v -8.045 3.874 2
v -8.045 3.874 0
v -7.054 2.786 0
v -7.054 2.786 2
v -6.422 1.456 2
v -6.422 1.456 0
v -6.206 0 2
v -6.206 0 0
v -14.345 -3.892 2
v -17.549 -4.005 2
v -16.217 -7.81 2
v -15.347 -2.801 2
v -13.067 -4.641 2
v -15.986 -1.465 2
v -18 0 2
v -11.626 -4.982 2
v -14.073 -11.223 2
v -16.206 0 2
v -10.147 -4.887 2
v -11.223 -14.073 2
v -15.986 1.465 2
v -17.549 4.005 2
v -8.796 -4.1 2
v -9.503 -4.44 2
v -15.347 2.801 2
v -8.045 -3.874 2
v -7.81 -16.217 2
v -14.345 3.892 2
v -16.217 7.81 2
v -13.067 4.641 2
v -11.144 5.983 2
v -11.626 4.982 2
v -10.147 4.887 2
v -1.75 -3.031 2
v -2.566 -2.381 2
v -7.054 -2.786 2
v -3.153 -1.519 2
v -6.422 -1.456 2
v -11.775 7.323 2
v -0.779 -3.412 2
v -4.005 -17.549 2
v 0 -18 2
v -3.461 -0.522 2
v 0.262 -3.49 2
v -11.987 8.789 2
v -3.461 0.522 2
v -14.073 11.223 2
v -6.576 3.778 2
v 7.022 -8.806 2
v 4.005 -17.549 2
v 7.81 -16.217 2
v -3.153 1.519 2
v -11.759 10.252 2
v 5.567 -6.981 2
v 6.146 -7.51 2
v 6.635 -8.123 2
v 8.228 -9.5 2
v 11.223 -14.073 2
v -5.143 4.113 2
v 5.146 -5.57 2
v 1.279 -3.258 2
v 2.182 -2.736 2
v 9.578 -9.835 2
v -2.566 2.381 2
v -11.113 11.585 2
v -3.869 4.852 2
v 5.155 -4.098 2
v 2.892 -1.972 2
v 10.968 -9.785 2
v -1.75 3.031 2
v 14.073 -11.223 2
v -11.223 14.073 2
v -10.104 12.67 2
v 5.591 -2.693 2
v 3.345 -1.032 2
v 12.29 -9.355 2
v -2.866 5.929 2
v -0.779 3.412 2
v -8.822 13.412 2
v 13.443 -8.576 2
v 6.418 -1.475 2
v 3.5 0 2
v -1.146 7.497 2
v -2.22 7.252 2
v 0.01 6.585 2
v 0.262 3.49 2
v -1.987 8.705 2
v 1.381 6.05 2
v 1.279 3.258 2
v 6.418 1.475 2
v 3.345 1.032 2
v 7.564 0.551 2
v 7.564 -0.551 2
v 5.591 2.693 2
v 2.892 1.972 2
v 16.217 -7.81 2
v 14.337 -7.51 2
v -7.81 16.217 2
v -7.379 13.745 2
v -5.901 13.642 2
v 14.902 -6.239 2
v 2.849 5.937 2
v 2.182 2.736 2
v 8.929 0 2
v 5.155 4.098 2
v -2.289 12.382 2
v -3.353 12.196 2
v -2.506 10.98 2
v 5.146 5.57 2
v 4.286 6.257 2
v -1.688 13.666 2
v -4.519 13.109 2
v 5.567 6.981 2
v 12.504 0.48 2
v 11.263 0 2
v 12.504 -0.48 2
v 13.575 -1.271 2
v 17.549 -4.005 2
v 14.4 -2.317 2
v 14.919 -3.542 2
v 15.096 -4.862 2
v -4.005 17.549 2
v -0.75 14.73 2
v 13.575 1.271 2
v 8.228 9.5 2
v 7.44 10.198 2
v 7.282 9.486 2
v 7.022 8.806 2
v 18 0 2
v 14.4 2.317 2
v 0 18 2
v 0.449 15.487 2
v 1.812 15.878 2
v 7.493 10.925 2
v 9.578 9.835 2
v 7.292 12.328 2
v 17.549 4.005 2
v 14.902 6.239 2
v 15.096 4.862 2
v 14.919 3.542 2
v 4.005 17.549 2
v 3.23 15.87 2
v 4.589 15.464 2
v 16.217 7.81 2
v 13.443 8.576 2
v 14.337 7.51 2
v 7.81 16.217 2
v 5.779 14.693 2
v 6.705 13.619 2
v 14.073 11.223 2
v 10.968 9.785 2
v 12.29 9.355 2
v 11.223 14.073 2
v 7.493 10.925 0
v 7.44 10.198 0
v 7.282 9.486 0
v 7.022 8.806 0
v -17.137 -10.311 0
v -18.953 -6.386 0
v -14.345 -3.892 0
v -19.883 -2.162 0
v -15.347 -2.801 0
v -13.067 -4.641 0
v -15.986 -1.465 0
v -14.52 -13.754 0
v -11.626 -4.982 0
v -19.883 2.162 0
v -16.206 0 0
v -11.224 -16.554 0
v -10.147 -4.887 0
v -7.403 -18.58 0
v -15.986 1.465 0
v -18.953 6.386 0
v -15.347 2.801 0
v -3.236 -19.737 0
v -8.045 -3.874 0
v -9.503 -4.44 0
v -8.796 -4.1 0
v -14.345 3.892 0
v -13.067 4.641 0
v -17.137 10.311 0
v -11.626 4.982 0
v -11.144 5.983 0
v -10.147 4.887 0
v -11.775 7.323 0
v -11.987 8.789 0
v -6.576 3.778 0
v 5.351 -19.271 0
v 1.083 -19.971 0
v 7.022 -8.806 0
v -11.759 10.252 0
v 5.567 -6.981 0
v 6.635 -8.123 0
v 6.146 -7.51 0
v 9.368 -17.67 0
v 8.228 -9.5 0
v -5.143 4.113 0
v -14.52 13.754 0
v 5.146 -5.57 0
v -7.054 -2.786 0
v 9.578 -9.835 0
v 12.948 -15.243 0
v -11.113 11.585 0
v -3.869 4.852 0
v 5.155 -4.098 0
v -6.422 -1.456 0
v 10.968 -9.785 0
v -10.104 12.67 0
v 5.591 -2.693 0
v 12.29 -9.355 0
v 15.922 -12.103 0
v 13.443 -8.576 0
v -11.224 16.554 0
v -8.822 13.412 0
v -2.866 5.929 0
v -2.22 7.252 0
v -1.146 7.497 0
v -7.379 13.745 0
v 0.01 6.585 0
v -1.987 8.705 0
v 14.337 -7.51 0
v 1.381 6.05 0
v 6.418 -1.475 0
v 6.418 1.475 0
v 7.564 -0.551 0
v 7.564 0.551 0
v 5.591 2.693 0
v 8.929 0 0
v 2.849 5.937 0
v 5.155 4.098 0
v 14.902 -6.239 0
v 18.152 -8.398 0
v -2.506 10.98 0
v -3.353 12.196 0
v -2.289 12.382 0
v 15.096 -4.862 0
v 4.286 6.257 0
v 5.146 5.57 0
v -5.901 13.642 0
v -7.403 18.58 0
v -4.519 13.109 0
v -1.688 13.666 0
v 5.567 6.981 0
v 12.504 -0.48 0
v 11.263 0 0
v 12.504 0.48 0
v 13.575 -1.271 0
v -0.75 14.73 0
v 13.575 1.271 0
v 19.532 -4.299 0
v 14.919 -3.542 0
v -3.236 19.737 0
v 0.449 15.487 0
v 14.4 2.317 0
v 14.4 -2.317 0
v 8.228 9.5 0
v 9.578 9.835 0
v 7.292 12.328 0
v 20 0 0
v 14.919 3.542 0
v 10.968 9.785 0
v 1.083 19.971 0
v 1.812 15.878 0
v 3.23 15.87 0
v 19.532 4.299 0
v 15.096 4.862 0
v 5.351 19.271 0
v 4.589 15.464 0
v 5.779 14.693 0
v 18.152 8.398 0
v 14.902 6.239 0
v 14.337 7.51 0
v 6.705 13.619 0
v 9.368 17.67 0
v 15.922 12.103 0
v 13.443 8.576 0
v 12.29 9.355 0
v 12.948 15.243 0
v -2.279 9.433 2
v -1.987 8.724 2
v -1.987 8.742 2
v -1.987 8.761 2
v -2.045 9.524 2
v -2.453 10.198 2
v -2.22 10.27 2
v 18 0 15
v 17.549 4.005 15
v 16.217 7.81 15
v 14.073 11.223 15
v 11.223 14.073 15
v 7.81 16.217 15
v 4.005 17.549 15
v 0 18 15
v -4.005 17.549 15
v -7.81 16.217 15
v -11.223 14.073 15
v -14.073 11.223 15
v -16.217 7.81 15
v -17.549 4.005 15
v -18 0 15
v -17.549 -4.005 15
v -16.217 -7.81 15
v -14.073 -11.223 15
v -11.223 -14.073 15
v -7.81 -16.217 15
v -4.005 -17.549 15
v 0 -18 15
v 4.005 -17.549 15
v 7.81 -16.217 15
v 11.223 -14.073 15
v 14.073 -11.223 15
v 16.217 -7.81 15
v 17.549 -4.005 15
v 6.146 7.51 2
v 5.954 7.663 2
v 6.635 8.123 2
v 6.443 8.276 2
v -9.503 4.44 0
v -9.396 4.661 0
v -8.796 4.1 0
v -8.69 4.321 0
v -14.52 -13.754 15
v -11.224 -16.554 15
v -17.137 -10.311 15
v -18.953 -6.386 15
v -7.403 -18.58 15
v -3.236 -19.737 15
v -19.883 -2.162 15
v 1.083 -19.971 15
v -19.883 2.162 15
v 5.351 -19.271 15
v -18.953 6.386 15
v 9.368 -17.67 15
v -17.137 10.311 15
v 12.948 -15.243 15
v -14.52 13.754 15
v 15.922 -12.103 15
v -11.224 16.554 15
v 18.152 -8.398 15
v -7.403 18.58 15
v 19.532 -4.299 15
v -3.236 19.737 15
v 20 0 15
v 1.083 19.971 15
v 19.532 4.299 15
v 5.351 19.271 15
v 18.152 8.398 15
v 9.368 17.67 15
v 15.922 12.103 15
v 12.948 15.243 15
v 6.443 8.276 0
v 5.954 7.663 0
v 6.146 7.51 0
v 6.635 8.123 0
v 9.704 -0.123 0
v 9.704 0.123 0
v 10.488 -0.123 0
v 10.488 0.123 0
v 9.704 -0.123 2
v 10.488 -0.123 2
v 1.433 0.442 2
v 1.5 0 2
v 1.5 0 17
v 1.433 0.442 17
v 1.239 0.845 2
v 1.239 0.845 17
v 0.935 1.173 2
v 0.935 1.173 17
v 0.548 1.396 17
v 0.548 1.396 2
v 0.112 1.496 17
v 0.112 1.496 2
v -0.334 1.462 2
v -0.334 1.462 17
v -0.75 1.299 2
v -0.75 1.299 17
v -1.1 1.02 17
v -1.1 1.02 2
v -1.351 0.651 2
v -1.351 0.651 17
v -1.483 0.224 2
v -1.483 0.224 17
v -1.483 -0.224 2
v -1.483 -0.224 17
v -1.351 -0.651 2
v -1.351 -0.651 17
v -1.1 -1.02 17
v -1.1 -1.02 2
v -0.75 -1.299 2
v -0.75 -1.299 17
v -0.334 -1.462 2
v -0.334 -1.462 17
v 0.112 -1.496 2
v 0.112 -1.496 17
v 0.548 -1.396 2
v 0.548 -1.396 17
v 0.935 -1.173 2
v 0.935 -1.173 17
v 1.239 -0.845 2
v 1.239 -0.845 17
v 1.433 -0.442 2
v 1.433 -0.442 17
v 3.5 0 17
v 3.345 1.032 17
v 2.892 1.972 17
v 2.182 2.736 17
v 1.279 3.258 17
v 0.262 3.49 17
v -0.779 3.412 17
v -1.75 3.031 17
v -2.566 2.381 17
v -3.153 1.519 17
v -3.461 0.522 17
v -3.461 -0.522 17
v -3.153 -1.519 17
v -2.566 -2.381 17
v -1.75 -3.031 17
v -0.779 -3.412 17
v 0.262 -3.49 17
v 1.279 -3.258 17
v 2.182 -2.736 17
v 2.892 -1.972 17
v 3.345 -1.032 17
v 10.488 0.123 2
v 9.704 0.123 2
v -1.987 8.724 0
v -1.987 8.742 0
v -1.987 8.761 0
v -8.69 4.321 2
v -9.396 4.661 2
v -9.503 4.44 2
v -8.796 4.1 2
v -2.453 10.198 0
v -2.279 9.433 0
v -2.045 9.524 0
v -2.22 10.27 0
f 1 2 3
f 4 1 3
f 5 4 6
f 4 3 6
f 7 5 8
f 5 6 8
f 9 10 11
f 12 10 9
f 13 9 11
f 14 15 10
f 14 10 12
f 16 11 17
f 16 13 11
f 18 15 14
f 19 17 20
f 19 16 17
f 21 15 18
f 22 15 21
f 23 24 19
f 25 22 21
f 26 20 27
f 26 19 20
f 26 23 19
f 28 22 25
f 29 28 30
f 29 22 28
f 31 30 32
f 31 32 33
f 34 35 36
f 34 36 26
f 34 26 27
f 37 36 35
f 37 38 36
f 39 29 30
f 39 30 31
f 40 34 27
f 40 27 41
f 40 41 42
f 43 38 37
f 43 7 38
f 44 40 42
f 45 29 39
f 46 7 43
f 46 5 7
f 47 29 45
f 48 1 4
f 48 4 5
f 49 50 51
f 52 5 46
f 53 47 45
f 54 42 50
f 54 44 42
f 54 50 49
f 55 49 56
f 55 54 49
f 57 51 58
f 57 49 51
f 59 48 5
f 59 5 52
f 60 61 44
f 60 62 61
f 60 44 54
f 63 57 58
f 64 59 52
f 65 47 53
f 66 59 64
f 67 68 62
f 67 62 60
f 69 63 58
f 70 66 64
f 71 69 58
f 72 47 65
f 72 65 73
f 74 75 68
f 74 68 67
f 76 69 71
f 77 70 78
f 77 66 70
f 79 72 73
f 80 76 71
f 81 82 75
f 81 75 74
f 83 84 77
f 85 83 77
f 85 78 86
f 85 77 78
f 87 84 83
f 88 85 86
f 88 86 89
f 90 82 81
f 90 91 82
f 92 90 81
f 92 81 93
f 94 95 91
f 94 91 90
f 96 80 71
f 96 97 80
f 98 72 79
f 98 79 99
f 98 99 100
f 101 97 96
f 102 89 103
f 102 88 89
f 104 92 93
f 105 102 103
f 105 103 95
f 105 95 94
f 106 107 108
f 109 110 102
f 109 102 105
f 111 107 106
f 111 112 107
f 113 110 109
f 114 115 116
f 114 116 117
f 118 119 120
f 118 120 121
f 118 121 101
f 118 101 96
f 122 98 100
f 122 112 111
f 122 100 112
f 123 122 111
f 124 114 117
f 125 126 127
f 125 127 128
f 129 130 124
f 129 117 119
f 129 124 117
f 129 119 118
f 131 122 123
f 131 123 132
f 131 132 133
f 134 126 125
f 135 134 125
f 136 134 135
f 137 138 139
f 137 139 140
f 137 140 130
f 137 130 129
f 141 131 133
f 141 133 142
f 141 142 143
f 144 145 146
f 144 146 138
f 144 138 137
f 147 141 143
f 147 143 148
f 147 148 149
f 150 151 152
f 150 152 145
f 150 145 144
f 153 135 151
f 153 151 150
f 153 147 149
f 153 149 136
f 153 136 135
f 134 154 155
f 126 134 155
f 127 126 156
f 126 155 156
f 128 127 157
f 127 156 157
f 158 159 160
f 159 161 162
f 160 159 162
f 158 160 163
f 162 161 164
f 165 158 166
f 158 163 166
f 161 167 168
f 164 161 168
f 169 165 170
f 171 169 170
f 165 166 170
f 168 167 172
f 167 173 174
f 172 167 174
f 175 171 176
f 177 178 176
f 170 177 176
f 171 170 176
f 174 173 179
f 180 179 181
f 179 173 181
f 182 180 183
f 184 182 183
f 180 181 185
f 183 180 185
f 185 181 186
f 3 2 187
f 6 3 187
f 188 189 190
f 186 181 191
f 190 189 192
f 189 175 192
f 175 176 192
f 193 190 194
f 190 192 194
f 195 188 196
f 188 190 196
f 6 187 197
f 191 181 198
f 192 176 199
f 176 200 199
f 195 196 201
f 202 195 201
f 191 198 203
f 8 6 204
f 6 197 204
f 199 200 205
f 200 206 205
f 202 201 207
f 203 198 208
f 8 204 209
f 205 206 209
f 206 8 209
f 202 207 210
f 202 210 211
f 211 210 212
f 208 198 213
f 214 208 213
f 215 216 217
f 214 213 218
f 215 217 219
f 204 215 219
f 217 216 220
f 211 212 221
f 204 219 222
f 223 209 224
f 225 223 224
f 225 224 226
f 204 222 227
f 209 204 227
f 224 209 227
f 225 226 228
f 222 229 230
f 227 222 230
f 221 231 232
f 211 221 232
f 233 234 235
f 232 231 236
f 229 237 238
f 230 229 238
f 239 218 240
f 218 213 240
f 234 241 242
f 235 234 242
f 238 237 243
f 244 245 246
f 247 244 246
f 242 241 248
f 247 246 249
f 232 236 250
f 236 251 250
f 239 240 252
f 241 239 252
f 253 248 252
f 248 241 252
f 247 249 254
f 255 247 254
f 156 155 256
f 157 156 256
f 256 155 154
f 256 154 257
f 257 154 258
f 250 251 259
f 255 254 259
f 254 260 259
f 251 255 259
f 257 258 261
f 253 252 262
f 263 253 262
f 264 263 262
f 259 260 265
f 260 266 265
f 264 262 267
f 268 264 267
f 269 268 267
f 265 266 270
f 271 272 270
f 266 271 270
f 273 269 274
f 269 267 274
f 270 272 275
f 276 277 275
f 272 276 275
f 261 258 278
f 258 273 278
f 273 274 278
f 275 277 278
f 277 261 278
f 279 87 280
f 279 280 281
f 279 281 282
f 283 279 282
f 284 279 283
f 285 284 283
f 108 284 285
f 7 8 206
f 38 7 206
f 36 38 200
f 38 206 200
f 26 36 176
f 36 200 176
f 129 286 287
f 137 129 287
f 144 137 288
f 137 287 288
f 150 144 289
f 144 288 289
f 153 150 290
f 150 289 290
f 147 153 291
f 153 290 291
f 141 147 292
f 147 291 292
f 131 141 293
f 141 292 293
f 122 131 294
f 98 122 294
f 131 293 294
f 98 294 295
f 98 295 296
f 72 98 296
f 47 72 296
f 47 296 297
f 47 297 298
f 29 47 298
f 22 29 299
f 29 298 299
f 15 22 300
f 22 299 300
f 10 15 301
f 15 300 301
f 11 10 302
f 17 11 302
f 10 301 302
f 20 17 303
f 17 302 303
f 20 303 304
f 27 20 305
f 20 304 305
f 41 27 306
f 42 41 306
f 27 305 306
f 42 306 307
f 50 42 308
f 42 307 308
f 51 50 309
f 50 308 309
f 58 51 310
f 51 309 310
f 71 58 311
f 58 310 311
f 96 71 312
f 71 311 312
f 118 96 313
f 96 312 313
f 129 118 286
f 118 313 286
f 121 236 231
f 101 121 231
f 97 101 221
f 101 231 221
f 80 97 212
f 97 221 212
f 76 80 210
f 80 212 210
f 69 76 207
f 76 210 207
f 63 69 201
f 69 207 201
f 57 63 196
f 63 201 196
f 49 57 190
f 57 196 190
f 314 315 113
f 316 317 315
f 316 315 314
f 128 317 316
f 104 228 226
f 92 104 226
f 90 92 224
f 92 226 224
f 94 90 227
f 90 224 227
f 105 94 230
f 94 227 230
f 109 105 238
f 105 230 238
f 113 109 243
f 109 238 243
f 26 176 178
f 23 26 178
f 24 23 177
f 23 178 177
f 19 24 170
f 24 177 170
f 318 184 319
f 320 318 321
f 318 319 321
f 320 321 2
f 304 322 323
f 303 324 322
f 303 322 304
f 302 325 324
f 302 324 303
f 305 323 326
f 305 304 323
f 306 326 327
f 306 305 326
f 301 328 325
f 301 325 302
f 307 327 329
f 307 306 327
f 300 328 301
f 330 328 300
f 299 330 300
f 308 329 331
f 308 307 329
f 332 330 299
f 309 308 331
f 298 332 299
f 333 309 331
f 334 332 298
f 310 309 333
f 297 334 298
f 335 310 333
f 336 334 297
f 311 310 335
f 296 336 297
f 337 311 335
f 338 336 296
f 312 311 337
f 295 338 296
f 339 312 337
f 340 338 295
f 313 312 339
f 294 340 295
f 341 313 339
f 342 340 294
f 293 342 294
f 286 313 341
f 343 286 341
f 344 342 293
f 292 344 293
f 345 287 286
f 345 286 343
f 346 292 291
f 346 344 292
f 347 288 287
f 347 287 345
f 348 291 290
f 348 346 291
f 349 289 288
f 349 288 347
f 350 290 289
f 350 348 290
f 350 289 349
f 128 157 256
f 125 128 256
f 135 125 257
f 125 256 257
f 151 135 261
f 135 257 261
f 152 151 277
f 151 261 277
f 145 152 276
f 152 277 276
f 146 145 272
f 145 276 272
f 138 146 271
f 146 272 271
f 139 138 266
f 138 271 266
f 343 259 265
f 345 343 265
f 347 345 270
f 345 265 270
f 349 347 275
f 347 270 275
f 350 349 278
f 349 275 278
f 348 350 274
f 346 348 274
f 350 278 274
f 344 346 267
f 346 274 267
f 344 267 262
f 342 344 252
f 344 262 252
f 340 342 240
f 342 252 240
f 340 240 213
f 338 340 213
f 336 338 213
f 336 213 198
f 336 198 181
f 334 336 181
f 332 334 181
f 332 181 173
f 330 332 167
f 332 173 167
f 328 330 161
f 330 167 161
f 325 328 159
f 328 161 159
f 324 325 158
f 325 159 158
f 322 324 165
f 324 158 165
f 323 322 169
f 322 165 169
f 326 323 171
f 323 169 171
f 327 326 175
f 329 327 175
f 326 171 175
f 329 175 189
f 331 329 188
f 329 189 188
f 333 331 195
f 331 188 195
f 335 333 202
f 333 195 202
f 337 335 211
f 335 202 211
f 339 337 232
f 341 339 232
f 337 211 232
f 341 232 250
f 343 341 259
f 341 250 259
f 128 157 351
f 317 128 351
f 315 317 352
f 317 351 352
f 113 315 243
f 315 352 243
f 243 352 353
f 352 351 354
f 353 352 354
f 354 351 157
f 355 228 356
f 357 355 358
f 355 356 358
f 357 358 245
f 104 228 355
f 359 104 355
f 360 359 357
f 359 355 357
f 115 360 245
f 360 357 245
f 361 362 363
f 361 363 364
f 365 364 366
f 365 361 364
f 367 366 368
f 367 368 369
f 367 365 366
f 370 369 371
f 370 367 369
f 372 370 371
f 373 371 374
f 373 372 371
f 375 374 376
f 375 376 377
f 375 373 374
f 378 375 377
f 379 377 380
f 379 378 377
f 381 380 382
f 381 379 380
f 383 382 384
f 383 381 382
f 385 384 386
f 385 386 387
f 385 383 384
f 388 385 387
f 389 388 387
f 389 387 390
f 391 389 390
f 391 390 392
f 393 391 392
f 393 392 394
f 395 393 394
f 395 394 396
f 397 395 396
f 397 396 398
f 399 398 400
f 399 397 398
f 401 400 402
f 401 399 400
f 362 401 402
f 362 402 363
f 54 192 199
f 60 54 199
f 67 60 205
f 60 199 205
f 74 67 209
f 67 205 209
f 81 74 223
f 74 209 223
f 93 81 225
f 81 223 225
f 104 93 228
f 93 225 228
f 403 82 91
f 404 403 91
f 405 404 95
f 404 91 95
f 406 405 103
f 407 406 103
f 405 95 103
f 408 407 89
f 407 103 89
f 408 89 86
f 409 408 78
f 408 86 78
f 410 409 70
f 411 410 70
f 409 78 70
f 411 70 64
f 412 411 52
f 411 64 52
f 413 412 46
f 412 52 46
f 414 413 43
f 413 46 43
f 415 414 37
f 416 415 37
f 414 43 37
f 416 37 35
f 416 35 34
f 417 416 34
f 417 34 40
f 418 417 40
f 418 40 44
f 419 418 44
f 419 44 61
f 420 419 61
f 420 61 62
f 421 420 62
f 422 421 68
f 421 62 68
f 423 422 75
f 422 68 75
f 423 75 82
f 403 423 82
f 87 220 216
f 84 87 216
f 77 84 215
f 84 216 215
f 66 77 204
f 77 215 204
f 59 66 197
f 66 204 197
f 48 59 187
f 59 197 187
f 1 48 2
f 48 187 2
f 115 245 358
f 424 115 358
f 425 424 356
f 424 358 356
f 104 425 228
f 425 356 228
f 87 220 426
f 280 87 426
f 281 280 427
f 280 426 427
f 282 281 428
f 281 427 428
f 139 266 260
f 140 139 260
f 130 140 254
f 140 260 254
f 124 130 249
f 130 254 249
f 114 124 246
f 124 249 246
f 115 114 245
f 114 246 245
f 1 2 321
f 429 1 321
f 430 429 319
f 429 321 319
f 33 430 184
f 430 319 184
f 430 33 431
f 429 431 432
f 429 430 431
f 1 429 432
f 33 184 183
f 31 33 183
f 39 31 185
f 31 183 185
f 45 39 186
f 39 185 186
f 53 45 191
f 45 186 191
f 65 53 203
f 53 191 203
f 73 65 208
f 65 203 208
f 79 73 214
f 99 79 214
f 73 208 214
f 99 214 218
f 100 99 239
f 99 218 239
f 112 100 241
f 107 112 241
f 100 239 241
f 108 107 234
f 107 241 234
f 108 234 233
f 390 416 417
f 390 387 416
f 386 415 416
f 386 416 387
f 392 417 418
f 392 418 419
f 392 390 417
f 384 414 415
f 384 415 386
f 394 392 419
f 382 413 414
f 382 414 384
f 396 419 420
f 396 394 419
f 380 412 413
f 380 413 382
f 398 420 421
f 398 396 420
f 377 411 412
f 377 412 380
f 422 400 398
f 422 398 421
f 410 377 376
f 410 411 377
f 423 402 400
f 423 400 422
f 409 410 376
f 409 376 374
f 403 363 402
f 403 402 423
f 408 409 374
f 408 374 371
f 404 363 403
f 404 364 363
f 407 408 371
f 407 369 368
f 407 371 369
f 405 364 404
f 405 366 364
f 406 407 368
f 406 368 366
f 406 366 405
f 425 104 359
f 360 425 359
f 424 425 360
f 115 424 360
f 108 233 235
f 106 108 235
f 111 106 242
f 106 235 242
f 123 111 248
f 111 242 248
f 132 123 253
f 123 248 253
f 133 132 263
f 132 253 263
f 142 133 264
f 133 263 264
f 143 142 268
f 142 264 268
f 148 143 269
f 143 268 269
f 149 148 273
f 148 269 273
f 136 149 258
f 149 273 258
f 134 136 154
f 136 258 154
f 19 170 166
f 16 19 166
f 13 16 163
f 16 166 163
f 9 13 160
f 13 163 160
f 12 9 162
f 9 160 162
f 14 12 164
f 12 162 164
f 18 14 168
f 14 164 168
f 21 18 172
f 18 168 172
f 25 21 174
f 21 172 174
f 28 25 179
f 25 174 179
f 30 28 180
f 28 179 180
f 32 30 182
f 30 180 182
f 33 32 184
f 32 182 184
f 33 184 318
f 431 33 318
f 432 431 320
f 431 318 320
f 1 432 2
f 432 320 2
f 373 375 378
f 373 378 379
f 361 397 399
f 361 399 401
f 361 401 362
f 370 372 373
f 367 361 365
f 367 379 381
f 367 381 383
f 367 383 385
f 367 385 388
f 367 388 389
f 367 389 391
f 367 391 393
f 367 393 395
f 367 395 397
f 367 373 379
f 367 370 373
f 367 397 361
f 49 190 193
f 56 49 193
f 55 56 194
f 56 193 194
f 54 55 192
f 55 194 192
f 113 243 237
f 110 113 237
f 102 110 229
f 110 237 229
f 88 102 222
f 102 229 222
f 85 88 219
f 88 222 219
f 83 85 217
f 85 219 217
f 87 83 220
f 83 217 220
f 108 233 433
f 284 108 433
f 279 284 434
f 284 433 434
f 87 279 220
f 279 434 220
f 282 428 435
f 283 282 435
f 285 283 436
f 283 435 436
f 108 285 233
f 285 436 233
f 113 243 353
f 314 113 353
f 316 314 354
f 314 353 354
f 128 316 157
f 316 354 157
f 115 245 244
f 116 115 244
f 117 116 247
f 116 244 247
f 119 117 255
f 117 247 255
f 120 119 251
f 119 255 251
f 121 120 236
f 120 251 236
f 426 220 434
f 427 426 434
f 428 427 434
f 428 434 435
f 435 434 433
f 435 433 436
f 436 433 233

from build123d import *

# Parameters (mm, degrees)
F0_R     = 20
F1_DEPTH = 15
F2_R     = 18
F3_DEPTH = 13
F4_R     = 3.5
F4_R_2   = 1.5
F5_DEPTH = 15
F7_DEPTH = 2


# Not quite as in the source:
# - a feature names something its author has since deleted; it is built from what else it names


with BuildPart() as f1:
    # F0 (on Top) → F1 (new body)
    with BuildSketch(Plane.XY):
        Circle(F0_R)
    extrude(amount=F1_DEPTH)

    # F2 (on face) → F3 (cut)
    with BuildSketch(Plane.XY.offset(15)):
        Circle(F2_R)
    extrude(amount=-F3_DEPTH, mode=Mode.SUBTRACT)

    # F4 (on face) → F5 (join)
    with BuildSketch(Plane.XY.offset(2)):
        Circle(F4_R)
        Circle(F4_R_2, mode=Mode.SUBTRACT)
    extrude(amount=F5_DEPTH)

    # F6 (on face) → F7 (cut)
    with BuildSketch(Plane(origin=(0, 0, 0), x_dir=(1, 0, 0), z_dir=(0, 0, -1))):
        with BuildLine():
            ThreePointArc((-8.0447609019, -3.8741526647), (-6.6887361359, -2.1442685218), (-6.2056059045, 0))
            ThreePointArc((-6.2056059045, 0), (-6.6887361359, 2.1442685218), (-8.0447609019, 3.8741526647))
            ThreePointArc((-8.0447609019, 3.8741526647), (-9.1559997007, 4.2560511367), (-10.1474260077, 4.8867428115))
            ThreePointArc((-10.1474260077, 4.8867428115), (-16.2056059045, 0), (-10.1474260077, -4.8867428115))
            ThreePointArc((-10.1474260077, -4.8867428115), (-9.1559997007, -4.2560511367), (-8.0447609019, -3.8741526647))
        make_face()
        with BuildLine():
            ThreePointArc((7.0222366791, 8.8056062773), (6.4026393038, 7.8072089599), (5.5671472783, 6.9809818809))
            ThreePointArc((5.5671472783, 6.9809818809), (5.5910577264, 2.6925114933), (8.9290109664, 0))
            ThreePointArc((8.9290109664, 0), (10.0959020659, 0.1380698111), (11.2627931654, 0))
            ThreePointArc((11.2627931654, 0), (14.0223798449, 1.7663248763), (15.0959020659, 4.8619301889))
            ThreePointArc((15.0959020659, 4.8619301889), (12.2904034974, 9.3546090632), (7.0222366791, 8.8056062773))
        make_face()
        with BuildLine():
            ThreePointArc((8.9290109664, 0), (5.5910577264, -2.6925114933), (5.5671472783, -6.9809818809))
            ThreePointArc((5.5671472783, -6.9809818809), (6.4026393038, -7.8072089599), (7.0222366791, -8.8056062773))
            ThreePointArc((7.0222366791, -8.8056062773), (12.2904034974, -9.3546090632), (15.0959020659, -4.8619301889))
            ThreePointArc((15.0959020659, -4.8619301889), (14.0223798449, -1.7663248763), (11.2627931654, 0))
            ThreePointArc((11.2627931654, 0), (10.0959020659, -0.1380698111), (8.9290109664, 0))
        make_face()
        with BuildLine():
            ThreePointArc((5.5671472783, -6.9809818809), (1.3808772216, -6.0500184083), (-1.9868918596, -8.7051420193))
            ThreePointArc((-1.9868918596, -8.7051420193), (-1.9866587193, -8.7330183145), (-1.9865810051, -8.7608954763))
            ThreePointArc((-1.9865810051, -8.7608954763), (-2.118220462, -9.9006610761), (-2.5062072541, -10.9804114261))
            ThreePointArc((-2.5062072541, -10.9804114261), (2.5213590532, -15.924580255), (7.4934818914, -10.9246579692))
            ThreePointArc((7.4934818914, -10.9246579692), (7.3742489386, -9.8392488156), (7.0222366791, -8.8056062773))
            ThreePointArc((7.0222366791, -8.8056062773), (6.1867446536, -7.9793791982), (5.5671472783, -6.9809818809))
        make_face()
        with BuildLine():
            ThreePointArc((-1.9868918596, -8.7051420193), (-3.8691319958, -4.8517380639), (-8.0447609019, -3.8741526647))
            ThreePointArc((-8.0447609019, -3.8741526647), (-9.0361872089, -4.5048443395), (-10.1474260077, -4.8867428115))
            ThreePointArc((-10.1474260077, -4.8867428115), (-10.1040300144, -12.6700528886), (-2.5062072541, -10.9804114261))
            ThreePointArc((-2.5062072541, -10.9804114261), (-2.3811576695, -9.8120532994), (-1.9868918596, -8.7051420193))
        make_face()
    extrude(amount=-F7_DEPTH, mode=Mode.SUBTRACT)


solid = f1.part
